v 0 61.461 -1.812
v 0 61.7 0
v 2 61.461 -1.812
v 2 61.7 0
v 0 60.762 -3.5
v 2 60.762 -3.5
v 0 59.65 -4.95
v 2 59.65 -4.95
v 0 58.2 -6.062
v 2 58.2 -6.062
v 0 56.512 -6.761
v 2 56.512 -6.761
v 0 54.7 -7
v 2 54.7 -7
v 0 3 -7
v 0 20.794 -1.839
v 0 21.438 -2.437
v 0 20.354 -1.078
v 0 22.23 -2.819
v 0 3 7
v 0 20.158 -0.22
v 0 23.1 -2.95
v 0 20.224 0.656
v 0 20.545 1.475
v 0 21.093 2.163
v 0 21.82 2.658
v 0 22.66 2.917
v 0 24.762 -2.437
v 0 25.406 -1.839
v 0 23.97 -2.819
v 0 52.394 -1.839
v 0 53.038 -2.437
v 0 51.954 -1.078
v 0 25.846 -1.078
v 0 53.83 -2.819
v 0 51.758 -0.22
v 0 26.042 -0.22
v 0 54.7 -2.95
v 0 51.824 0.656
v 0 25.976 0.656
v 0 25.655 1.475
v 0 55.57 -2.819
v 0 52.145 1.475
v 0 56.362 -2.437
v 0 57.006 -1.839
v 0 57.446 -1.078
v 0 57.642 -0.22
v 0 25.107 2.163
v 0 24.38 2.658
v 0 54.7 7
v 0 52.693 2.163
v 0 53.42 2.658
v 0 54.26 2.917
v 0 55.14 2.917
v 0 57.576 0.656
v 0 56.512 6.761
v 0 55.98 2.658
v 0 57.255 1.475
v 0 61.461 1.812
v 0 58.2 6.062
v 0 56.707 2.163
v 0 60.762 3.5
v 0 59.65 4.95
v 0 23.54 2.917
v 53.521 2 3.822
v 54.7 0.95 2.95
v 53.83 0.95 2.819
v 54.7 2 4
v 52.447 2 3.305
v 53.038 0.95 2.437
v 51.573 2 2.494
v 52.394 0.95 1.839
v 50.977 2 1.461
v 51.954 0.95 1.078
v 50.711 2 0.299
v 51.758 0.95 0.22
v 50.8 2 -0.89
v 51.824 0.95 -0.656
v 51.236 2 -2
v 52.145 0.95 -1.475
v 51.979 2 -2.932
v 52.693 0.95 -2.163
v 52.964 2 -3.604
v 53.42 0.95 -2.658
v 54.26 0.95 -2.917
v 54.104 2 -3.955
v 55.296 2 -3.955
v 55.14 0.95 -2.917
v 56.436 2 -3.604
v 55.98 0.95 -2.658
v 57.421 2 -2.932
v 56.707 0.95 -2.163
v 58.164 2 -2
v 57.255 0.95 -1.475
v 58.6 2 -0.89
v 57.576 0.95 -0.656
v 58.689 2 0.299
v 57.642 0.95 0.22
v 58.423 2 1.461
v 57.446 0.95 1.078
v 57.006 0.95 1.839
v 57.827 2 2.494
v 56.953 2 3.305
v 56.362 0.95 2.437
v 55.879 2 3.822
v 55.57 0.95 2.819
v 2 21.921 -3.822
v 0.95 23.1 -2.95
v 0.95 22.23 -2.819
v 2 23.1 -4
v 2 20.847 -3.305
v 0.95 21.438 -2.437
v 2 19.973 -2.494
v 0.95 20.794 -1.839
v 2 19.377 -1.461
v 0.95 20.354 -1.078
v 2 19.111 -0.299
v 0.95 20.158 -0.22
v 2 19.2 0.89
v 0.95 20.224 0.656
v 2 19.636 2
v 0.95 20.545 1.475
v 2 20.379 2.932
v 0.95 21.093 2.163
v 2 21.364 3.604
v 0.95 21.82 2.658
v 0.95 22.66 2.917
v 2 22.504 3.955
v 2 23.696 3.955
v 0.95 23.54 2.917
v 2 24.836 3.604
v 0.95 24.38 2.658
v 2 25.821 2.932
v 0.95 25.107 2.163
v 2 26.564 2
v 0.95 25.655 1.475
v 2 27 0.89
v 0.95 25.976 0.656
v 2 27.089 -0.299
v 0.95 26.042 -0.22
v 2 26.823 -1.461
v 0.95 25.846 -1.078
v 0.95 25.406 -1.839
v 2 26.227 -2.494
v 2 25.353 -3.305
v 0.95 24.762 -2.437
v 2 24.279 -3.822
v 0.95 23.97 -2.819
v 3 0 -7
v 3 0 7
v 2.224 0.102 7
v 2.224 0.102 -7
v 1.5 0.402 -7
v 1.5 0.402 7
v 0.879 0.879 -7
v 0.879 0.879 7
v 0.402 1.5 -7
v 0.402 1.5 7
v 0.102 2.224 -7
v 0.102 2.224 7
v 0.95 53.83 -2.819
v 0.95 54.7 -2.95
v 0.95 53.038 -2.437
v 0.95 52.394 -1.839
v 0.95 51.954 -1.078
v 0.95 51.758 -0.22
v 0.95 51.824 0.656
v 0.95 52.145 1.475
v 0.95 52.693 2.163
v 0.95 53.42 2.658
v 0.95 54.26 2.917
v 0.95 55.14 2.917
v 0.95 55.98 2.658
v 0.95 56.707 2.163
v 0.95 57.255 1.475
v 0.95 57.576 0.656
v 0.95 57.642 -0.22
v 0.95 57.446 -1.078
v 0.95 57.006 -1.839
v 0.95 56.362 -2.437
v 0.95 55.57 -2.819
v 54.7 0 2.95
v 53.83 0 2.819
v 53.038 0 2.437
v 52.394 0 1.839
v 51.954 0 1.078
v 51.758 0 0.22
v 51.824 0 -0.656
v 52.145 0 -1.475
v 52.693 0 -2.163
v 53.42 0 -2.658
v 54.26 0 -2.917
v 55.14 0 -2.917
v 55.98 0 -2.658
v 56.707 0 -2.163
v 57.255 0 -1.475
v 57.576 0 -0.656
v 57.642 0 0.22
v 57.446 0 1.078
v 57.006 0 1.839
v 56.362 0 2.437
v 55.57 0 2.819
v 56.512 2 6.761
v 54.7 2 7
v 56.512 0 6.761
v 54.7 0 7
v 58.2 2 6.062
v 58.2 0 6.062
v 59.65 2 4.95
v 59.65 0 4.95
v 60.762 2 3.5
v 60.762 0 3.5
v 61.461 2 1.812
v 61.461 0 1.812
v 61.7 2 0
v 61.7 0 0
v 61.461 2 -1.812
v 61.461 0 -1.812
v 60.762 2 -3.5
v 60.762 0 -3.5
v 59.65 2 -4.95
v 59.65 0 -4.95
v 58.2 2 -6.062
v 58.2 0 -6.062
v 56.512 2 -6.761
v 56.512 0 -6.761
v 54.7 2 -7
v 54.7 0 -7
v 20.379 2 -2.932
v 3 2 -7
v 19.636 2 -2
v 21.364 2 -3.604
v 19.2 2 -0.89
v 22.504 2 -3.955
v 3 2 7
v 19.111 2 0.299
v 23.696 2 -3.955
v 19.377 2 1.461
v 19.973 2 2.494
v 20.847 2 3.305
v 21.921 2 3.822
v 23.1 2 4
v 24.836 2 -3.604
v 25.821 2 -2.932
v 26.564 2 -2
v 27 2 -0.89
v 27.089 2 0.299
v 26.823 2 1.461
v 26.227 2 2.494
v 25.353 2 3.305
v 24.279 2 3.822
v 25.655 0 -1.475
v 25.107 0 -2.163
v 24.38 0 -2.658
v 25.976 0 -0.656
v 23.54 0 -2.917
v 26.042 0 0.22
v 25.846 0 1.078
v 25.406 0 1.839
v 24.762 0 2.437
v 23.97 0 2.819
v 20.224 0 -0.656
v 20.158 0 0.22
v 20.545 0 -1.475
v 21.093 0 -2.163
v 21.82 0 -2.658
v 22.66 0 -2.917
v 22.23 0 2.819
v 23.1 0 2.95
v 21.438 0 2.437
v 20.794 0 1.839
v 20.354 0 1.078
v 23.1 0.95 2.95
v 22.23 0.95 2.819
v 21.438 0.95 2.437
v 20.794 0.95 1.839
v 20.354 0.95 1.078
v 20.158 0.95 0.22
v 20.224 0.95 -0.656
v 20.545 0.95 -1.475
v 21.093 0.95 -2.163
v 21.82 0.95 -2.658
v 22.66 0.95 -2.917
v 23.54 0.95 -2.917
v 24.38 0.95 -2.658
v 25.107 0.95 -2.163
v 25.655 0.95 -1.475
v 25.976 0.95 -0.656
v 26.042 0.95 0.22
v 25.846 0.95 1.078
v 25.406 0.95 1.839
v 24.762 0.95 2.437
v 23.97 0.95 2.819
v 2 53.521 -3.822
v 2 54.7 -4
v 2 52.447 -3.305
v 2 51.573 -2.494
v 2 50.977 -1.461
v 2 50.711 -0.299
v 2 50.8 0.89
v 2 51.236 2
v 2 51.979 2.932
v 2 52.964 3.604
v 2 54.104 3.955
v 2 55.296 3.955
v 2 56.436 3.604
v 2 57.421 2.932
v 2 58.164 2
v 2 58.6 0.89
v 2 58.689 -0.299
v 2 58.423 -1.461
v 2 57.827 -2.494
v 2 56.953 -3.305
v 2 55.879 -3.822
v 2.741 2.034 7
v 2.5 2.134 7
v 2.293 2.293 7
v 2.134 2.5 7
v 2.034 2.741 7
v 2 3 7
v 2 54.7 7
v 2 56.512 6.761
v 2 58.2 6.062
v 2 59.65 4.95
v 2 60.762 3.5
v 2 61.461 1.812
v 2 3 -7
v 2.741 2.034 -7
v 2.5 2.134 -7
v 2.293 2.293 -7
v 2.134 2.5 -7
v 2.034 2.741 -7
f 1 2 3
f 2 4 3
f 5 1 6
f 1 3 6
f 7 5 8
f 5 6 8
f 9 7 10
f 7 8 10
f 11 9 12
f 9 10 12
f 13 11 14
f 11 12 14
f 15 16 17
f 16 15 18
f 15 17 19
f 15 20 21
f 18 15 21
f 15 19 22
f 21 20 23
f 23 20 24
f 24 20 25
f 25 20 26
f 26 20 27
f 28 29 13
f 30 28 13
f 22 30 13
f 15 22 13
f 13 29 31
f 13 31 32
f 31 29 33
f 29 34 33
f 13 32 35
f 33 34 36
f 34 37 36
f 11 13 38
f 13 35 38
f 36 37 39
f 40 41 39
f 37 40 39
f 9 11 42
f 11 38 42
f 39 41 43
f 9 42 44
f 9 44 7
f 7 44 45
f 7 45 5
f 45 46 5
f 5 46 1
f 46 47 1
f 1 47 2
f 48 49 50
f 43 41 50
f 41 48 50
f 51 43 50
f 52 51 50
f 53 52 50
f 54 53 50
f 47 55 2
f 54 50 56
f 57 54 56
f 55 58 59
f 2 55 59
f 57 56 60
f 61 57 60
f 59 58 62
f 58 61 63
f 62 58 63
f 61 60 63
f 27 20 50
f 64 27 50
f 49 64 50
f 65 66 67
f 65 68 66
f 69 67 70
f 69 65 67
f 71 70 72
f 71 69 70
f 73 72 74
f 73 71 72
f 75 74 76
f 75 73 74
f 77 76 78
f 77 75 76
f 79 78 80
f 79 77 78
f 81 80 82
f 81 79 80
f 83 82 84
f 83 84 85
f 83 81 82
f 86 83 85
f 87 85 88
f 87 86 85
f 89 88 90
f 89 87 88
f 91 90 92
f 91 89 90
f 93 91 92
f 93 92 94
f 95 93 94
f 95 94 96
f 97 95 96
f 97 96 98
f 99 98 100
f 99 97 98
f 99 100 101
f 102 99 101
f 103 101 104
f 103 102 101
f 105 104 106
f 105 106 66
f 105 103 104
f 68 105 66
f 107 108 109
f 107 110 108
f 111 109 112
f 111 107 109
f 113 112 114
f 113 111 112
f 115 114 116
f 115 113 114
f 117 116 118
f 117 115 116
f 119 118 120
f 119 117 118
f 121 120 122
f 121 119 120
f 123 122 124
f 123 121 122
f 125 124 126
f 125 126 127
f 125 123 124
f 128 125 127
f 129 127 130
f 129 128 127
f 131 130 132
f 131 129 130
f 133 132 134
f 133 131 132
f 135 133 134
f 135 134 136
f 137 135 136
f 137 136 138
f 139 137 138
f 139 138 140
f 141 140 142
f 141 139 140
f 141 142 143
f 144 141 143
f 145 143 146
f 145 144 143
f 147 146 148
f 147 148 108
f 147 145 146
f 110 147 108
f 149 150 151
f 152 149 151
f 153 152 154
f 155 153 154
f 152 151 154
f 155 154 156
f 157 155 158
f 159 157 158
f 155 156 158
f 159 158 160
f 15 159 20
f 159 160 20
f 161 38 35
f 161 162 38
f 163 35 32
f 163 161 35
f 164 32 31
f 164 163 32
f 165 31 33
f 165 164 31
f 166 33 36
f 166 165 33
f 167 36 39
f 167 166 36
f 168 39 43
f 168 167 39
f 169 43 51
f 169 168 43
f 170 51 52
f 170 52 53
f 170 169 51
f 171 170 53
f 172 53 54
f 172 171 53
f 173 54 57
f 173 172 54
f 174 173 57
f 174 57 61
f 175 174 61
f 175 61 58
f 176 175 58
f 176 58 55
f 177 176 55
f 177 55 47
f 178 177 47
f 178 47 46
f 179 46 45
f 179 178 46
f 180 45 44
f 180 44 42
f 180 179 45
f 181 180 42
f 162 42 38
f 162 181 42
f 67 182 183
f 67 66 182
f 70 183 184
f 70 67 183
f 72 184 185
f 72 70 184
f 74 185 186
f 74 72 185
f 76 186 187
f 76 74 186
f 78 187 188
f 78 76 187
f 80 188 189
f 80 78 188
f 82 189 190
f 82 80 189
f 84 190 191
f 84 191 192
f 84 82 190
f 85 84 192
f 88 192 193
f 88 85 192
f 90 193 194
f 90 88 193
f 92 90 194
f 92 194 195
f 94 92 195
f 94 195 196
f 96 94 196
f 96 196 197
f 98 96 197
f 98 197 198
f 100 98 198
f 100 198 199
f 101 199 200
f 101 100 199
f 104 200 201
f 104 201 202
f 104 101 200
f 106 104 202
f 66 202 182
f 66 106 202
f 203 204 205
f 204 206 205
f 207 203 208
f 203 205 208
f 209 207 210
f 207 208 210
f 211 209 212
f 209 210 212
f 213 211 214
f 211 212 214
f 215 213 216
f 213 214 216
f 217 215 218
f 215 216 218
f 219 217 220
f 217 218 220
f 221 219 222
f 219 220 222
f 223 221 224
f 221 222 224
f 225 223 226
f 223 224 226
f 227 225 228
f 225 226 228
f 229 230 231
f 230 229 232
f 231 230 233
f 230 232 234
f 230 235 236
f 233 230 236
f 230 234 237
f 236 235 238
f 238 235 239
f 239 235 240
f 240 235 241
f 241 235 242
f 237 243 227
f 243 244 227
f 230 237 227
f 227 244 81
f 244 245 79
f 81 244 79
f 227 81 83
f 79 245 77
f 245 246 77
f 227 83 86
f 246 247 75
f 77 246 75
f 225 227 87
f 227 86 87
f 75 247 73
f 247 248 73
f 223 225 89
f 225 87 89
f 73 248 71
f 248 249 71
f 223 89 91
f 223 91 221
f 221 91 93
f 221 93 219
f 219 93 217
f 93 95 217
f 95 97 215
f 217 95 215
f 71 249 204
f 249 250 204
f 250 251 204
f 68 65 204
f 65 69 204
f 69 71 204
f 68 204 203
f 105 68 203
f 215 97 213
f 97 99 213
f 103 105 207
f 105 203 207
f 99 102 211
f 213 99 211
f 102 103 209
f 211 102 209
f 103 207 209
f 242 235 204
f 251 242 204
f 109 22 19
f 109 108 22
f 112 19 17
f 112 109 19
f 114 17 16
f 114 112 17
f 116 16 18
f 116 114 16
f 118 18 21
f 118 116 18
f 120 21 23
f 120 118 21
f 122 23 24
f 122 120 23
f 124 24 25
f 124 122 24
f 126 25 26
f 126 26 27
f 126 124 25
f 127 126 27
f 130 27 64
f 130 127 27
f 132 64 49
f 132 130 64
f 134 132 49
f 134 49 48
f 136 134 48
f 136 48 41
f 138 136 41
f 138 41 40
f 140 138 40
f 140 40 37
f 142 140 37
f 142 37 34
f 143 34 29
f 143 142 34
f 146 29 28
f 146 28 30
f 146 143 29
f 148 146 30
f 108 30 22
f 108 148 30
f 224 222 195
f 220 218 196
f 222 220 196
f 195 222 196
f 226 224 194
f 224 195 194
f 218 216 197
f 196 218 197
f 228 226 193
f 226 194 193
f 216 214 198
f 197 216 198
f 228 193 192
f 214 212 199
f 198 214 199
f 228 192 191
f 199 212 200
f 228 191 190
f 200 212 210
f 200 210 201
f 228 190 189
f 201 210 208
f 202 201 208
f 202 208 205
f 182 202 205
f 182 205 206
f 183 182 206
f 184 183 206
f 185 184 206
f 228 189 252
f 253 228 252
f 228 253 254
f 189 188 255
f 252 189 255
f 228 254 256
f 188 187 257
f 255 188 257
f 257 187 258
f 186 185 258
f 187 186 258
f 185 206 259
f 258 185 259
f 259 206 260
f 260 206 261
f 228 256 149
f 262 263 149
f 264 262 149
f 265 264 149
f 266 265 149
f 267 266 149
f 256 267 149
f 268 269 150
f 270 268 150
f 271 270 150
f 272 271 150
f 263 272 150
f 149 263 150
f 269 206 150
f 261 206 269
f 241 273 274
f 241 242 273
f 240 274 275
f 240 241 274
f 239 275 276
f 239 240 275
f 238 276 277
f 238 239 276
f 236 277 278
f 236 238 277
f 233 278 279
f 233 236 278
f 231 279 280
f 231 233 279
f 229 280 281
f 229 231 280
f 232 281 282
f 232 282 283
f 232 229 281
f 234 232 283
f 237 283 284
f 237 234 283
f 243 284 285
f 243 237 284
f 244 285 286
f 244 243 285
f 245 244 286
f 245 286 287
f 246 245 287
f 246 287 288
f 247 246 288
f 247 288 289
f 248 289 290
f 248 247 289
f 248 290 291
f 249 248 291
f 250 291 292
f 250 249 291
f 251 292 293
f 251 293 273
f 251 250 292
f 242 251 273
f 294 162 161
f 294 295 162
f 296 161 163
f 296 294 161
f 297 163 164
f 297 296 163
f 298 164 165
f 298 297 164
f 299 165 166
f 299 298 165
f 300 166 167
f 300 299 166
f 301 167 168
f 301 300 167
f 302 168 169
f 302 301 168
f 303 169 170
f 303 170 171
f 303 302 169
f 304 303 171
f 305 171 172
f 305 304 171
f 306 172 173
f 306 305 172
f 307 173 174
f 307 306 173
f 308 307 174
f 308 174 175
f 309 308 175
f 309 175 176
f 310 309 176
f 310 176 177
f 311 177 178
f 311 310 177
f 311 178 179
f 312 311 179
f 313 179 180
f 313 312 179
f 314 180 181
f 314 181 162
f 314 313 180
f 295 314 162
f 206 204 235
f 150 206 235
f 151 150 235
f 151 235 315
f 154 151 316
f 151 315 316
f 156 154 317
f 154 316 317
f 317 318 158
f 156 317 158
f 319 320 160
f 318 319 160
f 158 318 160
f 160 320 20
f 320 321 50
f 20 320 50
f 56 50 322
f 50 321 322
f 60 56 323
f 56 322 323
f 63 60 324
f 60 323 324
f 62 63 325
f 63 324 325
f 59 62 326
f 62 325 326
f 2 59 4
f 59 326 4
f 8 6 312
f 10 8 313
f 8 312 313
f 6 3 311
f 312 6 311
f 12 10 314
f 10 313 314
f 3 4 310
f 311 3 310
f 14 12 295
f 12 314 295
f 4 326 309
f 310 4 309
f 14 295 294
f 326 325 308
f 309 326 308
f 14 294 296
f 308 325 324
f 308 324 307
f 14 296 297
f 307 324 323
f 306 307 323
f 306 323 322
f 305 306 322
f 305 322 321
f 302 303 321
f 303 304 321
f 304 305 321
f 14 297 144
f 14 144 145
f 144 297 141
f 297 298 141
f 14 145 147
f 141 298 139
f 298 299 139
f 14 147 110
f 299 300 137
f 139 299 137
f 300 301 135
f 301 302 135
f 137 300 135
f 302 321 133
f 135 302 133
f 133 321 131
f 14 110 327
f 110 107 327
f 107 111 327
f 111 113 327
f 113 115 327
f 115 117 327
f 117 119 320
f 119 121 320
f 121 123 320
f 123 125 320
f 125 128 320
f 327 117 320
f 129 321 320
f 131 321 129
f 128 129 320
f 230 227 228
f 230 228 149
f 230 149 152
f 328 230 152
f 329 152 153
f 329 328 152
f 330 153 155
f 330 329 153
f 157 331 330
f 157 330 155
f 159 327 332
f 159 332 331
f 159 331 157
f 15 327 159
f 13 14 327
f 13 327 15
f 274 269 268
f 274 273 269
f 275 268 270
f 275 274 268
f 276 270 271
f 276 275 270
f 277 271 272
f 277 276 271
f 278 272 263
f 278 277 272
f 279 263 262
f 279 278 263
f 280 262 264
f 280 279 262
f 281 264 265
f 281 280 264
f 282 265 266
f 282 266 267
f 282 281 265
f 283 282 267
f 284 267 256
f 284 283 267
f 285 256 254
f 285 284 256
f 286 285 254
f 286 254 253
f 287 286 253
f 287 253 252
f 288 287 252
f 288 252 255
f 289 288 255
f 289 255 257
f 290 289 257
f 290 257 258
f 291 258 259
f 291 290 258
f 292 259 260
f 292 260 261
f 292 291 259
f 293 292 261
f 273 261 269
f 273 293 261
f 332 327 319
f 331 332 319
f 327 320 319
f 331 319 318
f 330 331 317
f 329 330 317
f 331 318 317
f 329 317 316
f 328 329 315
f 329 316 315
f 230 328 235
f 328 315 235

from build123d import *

# Parameters (mm, degrees)
BOSS_EXTRU_1_DEPTH                         = 7
CONG_1_R                                   = 7
FRAISAGE_POUR_VIS_T_TE_FRAIS_E_6_2_COUNT   = 2
FRAISAGE_POUR_VIS_T_TE_FRAIS_E_6_2_PITCH   = 31.6
FRAISAGE_POUR_VIS_T_TE_FRAIS_E_6_3_A_COUNT = 2
FRAISAGE_POUR_VIS_T_TE_FRAIS_E_6_3_A_PITCH = 31.6


with BuildPart() as part:
    # Esquisse1 → Boss.-Extru.1 (new, symmetric)
    with BuildSketch(Plane.XY):
        with BuildLine():
            Line((0, 3), (0, 61.7))
            Line((0, 61.7), (2, 61.7))
            Line((2, 61.7), (2, 3))
            ThreePointArc((2, 3), (2.292893219, 2.292893219), (3, 2))
            Line((3, 2), (61.7, 2))
            Line((61.7, 2), (61.7, 0))
            Line((61.7, 0), (3, 0))
            ThreePointArc((3, 0), (0.878679656, 0.878679656), (0, 3))
        make_face()
    extrude(amount=BOSS_EXTRU_1_DEPTH, both=True)

    # Congé1
    cong_1_edges = [part.edges().sort_by_distance(p)[0] for p in [
        (1, 61.7, -7),
        (1, 61.7, 7),
        (61.7, 1, -7),
        (61.7, 1, 7),
    ]]
    fillet(cong_1_edges, radius=CONG_1_R - 0.0001)  # a hair under: the kernel refuses the full size

    # Esquisse2 → Fraisage pour vis _ t_te frais_e _ 6 pan (revolve, cut)
    with BuildSketch(Plane(origin=(54.7, 2, 0), x_dir=(0, 0, 1), z_dir=(1, 0, 0))):
        Polygon((0, 0), (0, 2), (2.95, 2), (2.95, 1.05), (4, 0), align=None)
    fraisage_pour_vis_t_te_frais_e_6_pan = revolve(axis=Axis((54.7, 8.35, 0), (0, -1, 0)), mode=Mode.SUBTRACT)

    # Fraisage pour vis _ t_te frais_e _ 6 2: Fraisage pour vis _ t_te frais_e _ 6 pan ×2
    with Locations(*[(-i * FRAISAGE_POUR_VIS_T_TE_FRAIS_E_6_2_PITCH, 0, 0) for i in range(1, FRAISAGE_POUR_VIS_T_TE_FRAIS_E_6_2_COUNT)]):
        add(fraisage_pour_vis_t_te_frais_e_6_pan, mode=Mode.SUBTRACT)

    # Esquisse4 → Fraisage pour vis _ t_te frais_e _ 6 3 (revolve, cut)
    with BuildSketch(Plane(origin=(2, 54.7, 0), x_dir=(0, 0, -1), z_dir=(0, 1, 0))):
        Polygon((0, 0), (0, 2), (2.95, 2), (2.95, 1.05), (4, 0), align=None)
    fraisage_pour_vis_t_te_frais_e_6_3 = revolve(axis=Axis((8.35, 54.7, 0), (-1, 0, 0)), mode=Mode.SUBTRACT)

    # Fraisage pour vis _ t_te frais_e _ 6 3 a: Fraisage pour vis _ t_te frais_e _ 6 3 ×2
    with Locations(*[(0, -i * FRAISAGE_POUR_VIS_T_TE_FRAIS_E_6_3_A_PITCH, 0) for i in range(1, FRAISAGE_POUR_VIS_T_TE_FRAIS_E_6_3_A_COUNT)]):
        add(fraisage_pour_vis_t_te_frais_e_6_3, mode=Mode.SUBTRACT)


solid = part.part
